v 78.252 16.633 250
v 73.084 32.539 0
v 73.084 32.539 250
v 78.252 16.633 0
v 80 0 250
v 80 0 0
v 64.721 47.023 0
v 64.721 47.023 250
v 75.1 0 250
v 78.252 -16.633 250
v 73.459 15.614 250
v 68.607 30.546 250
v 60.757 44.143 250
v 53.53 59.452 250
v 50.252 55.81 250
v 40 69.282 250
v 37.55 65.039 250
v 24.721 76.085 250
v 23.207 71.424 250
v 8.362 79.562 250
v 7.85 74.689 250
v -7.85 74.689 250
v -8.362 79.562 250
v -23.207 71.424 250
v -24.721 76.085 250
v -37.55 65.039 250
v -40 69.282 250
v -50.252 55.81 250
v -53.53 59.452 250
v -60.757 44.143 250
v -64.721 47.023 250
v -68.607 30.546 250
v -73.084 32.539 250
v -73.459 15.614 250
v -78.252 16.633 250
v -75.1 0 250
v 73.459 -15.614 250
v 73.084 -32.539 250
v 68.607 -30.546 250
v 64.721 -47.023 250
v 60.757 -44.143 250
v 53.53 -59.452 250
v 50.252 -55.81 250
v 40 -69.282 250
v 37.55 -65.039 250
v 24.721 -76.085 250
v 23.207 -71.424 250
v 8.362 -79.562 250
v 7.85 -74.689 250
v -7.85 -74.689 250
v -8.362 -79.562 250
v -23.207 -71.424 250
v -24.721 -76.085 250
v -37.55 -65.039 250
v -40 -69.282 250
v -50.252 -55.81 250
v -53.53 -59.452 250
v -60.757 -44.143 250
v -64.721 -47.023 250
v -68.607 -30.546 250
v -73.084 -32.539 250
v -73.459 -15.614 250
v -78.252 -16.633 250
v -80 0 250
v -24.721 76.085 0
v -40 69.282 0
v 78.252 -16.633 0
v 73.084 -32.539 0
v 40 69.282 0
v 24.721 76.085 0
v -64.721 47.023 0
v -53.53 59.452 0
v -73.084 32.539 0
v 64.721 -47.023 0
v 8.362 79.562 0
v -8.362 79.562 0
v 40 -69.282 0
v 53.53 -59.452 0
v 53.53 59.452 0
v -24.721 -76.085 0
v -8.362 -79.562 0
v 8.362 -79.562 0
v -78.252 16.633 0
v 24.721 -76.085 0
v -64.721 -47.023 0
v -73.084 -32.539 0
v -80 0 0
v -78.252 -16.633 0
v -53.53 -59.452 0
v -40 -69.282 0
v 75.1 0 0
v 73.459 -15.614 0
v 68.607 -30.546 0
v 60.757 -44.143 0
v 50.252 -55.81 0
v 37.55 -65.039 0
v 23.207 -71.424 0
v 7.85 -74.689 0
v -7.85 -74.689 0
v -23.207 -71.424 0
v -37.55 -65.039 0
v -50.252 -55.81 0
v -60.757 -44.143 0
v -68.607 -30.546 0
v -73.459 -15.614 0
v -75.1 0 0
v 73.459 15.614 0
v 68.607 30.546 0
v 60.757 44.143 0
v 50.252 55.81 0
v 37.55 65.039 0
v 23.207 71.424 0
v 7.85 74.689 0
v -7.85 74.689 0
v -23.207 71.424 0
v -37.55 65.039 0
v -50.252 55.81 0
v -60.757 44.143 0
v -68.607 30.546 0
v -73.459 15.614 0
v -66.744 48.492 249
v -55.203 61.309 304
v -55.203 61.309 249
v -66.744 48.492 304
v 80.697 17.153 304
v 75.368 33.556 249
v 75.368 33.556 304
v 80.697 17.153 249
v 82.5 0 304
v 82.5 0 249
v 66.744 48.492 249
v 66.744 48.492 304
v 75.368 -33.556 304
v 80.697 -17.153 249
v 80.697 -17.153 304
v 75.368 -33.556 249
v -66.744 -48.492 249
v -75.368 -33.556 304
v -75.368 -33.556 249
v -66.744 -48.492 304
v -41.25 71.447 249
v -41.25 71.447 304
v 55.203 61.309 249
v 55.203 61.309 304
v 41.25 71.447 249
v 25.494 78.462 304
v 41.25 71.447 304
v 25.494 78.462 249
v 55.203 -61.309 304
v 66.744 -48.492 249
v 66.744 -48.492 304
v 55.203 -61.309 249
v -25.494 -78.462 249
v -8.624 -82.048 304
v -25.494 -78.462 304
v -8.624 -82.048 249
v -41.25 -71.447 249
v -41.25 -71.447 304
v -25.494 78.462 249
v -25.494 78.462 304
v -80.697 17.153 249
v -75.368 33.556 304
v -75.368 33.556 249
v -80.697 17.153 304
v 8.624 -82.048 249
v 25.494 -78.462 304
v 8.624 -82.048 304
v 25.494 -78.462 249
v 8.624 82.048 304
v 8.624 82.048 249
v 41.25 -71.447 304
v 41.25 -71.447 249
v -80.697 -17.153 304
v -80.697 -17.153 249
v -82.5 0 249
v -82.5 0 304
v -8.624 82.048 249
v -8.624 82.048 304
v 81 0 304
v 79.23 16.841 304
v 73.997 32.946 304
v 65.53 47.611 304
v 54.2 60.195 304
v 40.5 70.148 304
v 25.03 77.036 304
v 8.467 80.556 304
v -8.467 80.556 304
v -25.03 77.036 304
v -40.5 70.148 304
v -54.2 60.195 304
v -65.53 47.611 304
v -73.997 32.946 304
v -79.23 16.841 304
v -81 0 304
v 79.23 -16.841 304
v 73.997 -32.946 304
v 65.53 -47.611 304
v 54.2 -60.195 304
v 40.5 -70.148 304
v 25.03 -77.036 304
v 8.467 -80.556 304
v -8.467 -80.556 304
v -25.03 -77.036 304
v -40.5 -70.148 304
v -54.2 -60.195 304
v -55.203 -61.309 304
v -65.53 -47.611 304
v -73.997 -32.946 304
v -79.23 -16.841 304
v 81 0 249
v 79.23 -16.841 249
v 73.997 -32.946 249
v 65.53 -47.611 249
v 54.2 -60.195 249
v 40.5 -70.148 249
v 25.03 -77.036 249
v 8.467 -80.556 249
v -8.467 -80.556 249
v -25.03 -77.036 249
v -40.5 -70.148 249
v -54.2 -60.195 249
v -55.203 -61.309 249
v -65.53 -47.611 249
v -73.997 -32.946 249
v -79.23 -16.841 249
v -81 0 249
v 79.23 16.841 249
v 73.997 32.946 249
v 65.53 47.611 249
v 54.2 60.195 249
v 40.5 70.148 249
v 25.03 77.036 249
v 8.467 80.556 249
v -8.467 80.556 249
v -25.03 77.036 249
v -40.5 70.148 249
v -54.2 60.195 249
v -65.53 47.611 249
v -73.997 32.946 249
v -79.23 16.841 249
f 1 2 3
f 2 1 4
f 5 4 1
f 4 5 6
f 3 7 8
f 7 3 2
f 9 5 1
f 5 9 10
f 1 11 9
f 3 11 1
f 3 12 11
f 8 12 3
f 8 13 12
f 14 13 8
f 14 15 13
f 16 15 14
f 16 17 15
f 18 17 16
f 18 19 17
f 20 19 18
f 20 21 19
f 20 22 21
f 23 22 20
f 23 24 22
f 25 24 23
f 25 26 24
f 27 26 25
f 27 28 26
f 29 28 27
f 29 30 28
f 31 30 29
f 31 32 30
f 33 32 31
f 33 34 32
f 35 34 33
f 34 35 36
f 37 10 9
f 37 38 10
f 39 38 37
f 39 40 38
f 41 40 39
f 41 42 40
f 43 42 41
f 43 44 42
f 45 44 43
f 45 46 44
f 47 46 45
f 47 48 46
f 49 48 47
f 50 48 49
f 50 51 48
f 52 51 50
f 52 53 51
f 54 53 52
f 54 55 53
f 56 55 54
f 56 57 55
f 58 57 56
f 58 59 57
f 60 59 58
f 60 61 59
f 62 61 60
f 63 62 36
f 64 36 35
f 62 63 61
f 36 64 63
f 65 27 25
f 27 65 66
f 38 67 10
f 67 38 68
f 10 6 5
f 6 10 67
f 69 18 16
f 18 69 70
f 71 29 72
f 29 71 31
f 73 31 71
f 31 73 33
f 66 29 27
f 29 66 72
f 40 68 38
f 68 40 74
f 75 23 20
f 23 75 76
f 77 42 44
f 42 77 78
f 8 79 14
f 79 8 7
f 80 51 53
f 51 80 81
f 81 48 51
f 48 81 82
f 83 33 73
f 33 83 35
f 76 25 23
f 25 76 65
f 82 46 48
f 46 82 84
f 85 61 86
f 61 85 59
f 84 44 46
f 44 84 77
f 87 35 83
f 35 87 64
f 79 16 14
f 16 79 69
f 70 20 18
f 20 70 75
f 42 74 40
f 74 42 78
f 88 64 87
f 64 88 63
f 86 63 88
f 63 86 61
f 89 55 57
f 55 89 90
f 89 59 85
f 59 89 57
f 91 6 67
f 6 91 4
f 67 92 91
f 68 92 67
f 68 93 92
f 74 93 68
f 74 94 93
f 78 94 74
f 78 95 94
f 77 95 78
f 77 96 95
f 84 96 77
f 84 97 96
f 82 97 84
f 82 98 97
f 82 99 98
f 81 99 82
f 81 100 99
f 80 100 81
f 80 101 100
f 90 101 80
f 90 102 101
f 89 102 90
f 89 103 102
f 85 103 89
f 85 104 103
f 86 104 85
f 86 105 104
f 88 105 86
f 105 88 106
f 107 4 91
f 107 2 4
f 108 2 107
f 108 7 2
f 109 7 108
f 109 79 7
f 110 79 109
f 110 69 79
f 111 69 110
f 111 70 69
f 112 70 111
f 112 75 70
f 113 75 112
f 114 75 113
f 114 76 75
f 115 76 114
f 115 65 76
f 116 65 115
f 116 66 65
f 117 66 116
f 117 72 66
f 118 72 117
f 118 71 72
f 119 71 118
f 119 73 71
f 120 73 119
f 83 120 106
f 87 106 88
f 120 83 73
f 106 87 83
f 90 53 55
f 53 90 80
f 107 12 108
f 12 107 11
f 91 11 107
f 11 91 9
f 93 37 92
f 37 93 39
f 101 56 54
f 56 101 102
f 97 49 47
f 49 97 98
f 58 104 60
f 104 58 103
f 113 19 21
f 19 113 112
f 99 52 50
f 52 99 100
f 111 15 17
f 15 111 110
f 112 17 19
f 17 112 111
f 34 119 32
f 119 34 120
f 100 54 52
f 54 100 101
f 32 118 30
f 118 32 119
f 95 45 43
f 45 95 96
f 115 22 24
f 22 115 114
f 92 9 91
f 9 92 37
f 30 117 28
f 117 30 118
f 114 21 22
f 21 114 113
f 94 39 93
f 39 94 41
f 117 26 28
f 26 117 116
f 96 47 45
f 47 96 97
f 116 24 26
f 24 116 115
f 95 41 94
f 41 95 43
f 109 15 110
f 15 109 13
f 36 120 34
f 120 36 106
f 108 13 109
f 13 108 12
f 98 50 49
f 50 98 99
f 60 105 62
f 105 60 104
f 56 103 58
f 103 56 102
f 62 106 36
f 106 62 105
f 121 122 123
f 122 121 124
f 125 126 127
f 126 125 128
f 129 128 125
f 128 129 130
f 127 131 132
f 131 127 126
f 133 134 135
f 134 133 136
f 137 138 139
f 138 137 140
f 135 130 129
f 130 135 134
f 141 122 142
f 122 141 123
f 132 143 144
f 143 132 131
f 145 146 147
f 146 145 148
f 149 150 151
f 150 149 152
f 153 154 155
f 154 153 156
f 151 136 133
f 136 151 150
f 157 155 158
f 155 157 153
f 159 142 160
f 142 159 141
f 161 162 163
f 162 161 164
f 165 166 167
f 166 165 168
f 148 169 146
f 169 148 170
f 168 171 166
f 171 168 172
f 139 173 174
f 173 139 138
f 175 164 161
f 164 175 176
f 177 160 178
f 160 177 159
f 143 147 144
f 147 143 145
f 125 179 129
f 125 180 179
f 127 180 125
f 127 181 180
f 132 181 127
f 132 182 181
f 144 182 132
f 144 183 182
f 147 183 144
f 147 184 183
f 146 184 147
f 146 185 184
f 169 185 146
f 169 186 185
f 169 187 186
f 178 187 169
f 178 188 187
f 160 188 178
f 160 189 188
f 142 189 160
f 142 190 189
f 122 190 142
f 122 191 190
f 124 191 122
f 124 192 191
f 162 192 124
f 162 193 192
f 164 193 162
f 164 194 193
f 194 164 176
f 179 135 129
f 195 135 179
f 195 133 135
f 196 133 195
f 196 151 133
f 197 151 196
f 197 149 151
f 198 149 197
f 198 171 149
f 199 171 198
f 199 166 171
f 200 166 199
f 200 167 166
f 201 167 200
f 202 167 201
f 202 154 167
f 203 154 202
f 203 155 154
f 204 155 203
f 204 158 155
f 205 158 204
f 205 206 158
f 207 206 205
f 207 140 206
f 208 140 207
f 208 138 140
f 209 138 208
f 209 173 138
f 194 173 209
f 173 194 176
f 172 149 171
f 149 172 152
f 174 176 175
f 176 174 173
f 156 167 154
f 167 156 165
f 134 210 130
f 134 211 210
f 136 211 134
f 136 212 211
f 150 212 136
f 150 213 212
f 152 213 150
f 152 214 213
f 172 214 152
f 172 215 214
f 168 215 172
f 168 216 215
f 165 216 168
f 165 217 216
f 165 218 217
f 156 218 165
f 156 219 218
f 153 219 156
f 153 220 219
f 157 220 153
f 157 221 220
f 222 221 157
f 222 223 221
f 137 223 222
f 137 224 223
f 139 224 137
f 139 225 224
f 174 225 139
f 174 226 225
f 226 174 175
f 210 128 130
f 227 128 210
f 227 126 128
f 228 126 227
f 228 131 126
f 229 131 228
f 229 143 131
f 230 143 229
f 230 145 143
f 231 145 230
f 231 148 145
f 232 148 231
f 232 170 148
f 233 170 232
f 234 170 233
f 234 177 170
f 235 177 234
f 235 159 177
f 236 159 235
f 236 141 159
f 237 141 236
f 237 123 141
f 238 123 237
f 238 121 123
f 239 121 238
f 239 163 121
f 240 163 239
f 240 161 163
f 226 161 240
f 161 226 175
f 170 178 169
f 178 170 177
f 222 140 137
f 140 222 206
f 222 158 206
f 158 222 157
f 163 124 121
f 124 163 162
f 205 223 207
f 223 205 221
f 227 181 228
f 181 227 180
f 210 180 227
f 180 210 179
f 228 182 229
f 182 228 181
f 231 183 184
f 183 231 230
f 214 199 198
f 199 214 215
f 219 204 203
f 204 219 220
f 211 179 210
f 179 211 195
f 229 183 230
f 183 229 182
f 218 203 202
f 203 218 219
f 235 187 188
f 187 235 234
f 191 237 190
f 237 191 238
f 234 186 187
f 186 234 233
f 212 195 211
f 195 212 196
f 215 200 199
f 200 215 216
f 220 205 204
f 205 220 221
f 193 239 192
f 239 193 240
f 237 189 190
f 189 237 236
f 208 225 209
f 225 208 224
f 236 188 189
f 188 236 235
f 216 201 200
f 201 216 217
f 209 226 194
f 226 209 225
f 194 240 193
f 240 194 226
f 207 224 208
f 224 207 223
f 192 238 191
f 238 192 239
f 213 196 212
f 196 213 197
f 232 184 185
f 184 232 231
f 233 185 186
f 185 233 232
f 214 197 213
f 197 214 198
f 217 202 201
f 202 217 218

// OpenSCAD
// Parameters
nominal_diameter_mm = 160; //[80:320:1]
length_mm = 250; //[125:500:1]
wall_thickness_mm = 4.9; //[2.5:10:0.1]
include_end_fitting = 1; //[0:1:1]
fitting_length_mm = 55; //[25:110:1]
fitting_wall_extra_mm = 2.5; //[1:6:0.1]
fitting_inner_clearance_mm = 1; //[0.2:3:0.1]
fitting_stop_thickness_mm = 3; //[1:8:0.1]
fitting_stop_length_mm = 6; //[2:15:0.1]
fitting_stop_offset_from_end_mm = 18; //[5:40:1]
overlap_mm = 1; //[0.5:2:0.1]

// HT Pipe - complete geometry
module ht_pipe() {
  color([0.85, 0.85, 0.8]) { // Off-white for PVC
    // Pipe segment
    difference() {
      cylinder(r=nominal_diameter_mm/2, h=length_mm, center=false);
      translate([0, 0, -overlap_mm/2])
        cylinder(r=nominal_diameter_mm/2 - wall_thickness_mm, h=length_mm + overlap_mm, center=false);
    }
    
    if (include_end_fitting) {
      // End fitting
      difference() {
        translate([0, 0, length_mm - overlap_mm])
          cylinder(r=nominal_diameter_mm/2 + fitting_wall_extra_mm, h=fitting_length_mm, center=false);
        translate([0, 0, length_mm - overlap_mm - overlap_mm/2])
          cylinder(r=nominal_diameter_mm/2 + fitting_inner_clearance_mm, h=fitting_length_mm + overlap_mm, center=false);
        translate([0, 0, length_mm + fitting_stop_offset_from_end_mm - overlap_mm/2])
          cylinder(r=nominal_diameter_mm/2 + fitting_inner_clearance_mm - fitting_stop_thickness_mm, h=fitting_stop_length_mm + overlap_mm, center=false);
      }
    }
  }
}

// Assembly
module assembly() {
  ht_pipe();
}

assembly();
